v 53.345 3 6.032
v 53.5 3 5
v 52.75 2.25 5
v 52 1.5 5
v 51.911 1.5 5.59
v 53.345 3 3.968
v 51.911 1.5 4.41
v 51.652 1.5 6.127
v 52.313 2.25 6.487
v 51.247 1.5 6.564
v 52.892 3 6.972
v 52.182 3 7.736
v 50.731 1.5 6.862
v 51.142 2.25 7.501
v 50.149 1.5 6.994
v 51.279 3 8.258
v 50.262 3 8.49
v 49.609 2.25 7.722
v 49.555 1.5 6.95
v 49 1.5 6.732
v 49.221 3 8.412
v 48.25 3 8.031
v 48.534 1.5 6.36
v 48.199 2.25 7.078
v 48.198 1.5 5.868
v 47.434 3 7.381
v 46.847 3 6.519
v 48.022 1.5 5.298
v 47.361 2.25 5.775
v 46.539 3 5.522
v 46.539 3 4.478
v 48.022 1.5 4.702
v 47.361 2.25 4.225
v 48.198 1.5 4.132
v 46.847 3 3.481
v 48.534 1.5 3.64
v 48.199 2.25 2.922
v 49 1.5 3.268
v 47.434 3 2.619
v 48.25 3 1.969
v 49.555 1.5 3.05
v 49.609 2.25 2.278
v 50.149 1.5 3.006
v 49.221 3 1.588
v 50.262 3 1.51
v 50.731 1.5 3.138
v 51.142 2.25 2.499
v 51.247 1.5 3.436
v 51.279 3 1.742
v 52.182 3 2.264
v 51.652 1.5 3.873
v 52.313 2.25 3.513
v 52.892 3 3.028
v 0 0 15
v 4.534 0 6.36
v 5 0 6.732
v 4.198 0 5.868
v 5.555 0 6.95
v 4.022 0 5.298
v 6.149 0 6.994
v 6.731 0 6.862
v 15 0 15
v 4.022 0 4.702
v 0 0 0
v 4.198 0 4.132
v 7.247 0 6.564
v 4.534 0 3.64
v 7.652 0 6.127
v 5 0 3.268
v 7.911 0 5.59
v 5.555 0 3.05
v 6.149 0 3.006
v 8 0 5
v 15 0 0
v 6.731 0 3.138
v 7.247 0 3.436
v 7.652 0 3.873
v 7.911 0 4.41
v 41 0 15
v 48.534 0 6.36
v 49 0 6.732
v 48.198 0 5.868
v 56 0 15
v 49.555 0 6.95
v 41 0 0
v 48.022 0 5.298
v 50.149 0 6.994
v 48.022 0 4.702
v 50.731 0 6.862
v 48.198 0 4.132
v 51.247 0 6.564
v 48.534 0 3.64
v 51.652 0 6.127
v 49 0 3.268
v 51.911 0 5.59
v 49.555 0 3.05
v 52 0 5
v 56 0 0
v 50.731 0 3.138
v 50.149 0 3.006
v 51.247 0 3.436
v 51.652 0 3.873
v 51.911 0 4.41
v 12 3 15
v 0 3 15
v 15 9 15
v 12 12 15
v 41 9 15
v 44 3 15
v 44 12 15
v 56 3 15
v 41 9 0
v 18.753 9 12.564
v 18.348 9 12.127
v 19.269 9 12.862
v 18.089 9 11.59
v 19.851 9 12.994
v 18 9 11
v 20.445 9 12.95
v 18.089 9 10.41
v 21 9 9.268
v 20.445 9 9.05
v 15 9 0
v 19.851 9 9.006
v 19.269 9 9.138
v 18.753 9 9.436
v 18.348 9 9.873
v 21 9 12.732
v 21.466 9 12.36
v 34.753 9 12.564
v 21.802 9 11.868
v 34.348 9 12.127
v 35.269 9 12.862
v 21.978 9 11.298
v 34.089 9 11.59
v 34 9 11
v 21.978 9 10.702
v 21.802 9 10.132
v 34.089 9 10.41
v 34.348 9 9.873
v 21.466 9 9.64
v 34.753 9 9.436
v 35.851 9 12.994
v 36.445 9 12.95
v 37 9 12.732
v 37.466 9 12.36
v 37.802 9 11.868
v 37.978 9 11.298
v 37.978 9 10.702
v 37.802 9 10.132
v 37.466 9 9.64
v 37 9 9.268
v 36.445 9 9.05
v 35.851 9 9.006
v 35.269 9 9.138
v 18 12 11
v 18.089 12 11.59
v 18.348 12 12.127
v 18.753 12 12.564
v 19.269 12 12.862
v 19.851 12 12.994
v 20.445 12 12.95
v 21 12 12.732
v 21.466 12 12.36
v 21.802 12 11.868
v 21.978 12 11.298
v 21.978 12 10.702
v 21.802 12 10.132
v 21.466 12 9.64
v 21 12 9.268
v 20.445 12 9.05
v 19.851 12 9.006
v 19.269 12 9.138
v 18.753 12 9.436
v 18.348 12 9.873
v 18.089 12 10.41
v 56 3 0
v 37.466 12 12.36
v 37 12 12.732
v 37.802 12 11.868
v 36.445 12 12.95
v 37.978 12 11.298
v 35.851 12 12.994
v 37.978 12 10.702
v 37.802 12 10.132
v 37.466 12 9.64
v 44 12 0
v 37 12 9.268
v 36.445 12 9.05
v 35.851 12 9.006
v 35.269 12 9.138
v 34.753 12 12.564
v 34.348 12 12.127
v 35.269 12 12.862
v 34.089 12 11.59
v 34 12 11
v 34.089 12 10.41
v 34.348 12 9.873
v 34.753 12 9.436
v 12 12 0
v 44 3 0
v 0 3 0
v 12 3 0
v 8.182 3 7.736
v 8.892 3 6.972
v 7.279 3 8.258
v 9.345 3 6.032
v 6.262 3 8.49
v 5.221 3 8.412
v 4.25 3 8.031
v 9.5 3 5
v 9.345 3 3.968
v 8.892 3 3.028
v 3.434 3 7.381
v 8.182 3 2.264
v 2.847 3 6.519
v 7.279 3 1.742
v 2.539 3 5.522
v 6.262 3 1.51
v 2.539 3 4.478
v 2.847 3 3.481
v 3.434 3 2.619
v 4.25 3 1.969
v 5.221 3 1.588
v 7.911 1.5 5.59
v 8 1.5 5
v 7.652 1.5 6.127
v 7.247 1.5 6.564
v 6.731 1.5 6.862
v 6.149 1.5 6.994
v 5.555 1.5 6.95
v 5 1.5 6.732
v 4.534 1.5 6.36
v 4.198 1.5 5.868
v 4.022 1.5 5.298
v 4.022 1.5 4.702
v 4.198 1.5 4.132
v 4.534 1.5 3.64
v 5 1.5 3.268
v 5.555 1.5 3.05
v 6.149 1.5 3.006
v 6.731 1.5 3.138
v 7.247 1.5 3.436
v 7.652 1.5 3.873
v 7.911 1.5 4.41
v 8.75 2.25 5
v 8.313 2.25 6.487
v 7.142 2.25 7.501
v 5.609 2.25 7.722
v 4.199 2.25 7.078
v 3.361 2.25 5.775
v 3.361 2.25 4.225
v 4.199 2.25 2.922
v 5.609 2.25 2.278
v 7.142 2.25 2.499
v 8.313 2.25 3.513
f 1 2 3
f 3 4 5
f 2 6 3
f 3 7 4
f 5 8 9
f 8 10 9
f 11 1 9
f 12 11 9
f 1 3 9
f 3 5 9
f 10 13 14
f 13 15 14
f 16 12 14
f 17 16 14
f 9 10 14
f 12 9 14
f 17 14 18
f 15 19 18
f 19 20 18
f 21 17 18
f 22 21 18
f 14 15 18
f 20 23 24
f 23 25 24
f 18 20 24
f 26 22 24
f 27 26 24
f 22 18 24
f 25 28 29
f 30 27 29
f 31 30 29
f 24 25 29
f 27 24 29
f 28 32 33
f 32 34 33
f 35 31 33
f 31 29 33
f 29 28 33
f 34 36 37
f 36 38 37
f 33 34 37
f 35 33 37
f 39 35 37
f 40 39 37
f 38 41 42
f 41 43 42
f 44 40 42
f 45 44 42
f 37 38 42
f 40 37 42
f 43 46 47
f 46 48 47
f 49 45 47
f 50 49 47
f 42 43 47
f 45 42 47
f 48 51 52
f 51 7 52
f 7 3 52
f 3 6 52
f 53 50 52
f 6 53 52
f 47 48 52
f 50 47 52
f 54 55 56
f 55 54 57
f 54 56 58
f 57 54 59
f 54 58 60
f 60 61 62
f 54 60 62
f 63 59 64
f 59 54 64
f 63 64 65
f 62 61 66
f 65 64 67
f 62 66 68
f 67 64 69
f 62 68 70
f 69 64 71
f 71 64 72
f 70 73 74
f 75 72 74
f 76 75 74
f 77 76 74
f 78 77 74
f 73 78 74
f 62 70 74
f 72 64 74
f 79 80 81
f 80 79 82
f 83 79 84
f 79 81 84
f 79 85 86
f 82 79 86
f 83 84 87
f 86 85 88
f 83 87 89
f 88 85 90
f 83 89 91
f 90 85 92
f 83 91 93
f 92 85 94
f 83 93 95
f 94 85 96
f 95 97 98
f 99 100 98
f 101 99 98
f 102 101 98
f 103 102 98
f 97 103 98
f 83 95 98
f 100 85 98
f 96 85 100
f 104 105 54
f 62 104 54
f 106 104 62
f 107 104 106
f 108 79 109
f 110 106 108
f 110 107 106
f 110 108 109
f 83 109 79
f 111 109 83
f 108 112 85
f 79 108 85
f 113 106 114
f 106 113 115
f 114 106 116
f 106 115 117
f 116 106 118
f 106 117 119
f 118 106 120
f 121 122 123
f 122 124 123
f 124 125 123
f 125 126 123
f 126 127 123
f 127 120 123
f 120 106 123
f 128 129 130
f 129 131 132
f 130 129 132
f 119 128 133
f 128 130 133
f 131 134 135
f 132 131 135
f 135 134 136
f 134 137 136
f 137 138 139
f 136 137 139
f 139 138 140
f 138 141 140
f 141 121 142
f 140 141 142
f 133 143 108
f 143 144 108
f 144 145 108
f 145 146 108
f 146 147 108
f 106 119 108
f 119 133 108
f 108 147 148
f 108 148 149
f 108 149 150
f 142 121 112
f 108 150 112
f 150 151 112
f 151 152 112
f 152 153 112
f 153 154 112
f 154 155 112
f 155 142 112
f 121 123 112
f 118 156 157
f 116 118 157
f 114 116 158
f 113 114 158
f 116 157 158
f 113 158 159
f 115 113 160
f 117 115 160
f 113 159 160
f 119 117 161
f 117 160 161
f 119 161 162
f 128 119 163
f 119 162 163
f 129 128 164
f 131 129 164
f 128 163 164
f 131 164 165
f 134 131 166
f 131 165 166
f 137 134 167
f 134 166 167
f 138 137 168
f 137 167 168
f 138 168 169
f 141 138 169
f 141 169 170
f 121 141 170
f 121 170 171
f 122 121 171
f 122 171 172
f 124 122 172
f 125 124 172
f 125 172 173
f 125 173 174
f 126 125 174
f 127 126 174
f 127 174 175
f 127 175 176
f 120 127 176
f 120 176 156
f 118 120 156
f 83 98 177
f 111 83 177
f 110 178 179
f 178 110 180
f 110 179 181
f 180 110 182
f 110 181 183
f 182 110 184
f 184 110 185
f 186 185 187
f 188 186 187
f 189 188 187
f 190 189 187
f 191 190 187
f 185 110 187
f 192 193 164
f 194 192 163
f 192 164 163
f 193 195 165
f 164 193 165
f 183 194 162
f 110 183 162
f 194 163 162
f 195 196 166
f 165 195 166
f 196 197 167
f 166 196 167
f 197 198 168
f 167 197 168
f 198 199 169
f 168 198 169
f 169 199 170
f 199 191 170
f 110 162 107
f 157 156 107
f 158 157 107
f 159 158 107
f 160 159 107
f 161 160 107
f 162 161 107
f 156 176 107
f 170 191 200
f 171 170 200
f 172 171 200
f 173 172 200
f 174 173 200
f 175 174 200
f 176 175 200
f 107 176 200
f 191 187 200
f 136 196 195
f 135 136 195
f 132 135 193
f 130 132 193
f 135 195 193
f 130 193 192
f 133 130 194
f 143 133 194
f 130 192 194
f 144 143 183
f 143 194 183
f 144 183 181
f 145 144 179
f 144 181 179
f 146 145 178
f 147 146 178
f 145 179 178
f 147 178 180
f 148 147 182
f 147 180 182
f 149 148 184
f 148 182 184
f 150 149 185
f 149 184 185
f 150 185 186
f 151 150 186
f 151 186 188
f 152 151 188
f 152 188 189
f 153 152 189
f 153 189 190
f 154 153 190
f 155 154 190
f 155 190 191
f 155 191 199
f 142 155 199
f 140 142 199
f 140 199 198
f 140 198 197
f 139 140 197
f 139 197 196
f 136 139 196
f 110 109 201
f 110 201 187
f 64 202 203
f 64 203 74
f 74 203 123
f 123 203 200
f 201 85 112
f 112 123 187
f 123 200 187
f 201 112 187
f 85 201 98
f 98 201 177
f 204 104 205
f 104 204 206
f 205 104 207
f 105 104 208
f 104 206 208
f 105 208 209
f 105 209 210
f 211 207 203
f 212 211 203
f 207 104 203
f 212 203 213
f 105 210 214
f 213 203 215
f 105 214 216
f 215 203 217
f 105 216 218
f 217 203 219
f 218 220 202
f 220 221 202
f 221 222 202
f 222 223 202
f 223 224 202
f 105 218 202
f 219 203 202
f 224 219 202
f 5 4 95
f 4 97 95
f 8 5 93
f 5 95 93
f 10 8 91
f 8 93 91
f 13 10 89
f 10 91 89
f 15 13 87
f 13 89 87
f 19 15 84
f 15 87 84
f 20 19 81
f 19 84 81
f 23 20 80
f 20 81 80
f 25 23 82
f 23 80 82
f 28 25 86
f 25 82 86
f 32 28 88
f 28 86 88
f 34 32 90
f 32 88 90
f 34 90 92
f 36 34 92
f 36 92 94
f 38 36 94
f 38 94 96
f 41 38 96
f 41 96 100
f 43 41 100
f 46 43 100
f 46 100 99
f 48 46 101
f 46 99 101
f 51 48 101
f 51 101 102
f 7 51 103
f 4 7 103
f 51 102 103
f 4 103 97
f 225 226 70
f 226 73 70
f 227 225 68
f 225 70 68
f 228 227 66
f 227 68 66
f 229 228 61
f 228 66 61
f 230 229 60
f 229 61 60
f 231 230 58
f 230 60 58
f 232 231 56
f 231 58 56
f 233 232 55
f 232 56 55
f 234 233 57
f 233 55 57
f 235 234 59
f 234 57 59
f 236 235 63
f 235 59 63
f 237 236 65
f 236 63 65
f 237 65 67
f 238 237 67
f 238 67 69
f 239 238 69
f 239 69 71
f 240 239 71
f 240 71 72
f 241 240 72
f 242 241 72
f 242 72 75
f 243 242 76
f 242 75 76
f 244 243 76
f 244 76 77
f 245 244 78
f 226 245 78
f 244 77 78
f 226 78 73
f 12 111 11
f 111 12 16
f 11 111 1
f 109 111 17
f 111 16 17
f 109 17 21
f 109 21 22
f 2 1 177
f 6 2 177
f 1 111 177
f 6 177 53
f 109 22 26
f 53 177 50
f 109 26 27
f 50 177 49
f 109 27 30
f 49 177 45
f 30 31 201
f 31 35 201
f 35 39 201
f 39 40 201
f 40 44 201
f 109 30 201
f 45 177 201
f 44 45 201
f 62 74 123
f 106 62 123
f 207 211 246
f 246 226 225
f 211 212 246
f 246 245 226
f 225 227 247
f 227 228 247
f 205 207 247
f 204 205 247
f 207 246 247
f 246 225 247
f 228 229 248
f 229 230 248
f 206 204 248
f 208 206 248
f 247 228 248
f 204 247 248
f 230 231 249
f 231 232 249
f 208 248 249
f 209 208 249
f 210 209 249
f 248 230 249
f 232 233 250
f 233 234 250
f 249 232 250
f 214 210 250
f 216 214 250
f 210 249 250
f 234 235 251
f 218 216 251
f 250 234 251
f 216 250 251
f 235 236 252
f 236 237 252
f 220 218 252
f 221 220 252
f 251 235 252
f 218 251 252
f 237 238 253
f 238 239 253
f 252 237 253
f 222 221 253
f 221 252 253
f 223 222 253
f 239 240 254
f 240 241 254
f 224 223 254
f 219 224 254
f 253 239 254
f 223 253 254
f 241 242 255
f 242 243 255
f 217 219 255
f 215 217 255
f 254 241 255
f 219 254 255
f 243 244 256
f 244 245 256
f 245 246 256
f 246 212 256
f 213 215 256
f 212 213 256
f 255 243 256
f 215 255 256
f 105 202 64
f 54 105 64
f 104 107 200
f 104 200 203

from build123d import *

# Parameters (mm, degrees)
F1_DEPTH       = 15
F2_R           = 2
F3_DEPTH       = 25
F5_D           = 4
F5_CSINK_D     = 7
F5_CSINK_ANGLE = 90


with BuildPart() as f1:
    # F0 (on Top) → F1 (new body)
    with BuildSketch(Plane.XY):
        Polygon((0, 3), (0, 0), (15, 0), (15, 9), (41, 9), (41, 0), (56, 0), (56, 3), (44, 3), (44, 12), (12, 12), (12, 3), align=None)
    extrude(amount=F1_DEPTH)

    # F2 (on face) → F3 (cut)
    with BuildSketch(Plane(origin=(0, 12, 0), x_dir=(-1, 0, 0), z_dir=(0, 1, 0))):
        with Locations((-36, 11)):
            Circle(F2_R)
        with Locations((-20, 11)):
            Circle(F2_R)
    extrude(amount=-F3_DEPTH, mode=Mode.SUBTRACT)

    # F5 (through all)
    with Locations(Plane(origin=(0, 3, 0), x_dir=(-1, 0, 0), z_dir=(0, 1, 0))):
        with Locations((-6, 5), (-50, 5)):
            CounterSinkHole(F5_D / 2, F5_CSINK_D / 2, counter_sink_angle=F5_CSINK_ANGLE)


solid = f1.part
